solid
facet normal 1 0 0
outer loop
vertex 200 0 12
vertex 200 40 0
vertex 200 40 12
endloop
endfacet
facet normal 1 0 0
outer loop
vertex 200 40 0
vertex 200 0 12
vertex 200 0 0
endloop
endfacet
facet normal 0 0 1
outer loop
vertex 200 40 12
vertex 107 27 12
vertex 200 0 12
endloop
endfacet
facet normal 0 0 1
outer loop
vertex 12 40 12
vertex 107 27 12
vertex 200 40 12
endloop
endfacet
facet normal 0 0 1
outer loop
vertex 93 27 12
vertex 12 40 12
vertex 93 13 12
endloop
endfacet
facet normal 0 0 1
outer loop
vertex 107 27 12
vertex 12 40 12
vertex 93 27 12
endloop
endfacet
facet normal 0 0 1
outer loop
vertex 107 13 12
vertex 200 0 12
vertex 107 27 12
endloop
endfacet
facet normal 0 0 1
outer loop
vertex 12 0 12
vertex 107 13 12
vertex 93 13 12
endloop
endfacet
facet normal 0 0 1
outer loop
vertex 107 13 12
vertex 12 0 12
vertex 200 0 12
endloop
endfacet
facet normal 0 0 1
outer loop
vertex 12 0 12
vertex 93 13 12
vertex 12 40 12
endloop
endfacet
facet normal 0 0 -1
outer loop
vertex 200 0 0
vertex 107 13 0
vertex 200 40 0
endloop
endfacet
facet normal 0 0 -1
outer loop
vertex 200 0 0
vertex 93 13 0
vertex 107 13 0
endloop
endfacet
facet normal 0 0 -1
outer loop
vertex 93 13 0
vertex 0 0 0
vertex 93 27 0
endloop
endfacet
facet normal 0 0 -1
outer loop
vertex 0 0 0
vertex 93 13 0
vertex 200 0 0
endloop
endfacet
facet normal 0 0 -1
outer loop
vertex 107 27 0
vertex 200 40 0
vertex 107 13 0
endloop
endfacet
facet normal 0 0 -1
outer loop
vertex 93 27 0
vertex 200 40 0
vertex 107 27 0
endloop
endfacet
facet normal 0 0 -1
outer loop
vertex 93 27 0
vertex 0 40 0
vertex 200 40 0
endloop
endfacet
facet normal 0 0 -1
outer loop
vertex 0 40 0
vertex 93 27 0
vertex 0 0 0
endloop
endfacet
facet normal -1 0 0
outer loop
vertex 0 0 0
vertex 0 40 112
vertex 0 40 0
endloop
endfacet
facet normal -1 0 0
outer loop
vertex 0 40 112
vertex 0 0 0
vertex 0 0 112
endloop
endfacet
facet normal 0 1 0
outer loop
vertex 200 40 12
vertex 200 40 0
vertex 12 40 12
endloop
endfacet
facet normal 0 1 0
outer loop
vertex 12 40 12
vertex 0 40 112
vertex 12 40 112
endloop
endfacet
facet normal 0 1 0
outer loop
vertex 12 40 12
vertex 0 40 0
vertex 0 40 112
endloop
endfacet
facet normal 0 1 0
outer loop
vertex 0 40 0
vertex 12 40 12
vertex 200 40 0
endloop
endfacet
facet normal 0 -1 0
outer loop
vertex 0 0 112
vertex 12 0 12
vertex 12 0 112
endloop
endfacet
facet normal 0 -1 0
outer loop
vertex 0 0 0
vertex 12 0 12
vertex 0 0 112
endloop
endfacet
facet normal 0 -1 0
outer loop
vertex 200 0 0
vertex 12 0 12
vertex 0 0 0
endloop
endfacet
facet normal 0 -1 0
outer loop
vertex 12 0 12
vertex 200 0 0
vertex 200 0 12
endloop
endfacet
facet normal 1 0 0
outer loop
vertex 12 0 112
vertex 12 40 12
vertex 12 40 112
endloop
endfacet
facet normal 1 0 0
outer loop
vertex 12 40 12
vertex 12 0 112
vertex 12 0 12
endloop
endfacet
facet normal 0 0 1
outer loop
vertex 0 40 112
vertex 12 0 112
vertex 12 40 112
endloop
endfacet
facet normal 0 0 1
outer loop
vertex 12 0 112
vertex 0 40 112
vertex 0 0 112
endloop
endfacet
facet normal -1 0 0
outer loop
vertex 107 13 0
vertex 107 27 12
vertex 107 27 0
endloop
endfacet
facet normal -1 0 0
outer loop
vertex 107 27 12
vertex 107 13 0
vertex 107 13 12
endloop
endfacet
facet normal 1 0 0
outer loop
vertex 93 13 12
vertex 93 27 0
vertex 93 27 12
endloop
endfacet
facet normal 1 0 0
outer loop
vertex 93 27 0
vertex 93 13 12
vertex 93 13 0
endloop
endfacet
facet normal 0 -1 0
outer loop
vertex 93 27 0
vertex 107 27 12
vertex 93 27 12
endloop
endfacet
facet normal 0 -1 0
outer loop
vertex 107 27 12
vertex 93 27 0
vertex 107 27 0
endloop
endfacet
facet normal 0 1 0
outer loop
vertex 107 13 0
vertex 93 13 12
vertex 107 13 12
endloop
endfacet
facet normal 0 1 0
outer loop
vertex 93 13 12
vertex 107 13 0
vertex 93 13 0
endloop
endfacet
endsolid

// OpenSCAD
$fn = 32;

// ----------------------------------------------------------------------
// Gantry bracket: 200-250 mm L bracket
// ----------------------------------------------------------------------

// --- parameters (mm) ---
base_l = 200;             // base arm length, X
arm_w = 40;               // arm width, Y
thick = 12;               // arm thickness
up_h = 100;               // vertical arm height, Z
slot_w = 14;              // adjustment slot width in the base

total_h = up_h + thick;  // overall height

difference() {
  union() {
    cube([base_l, arm_w, thick]);
    cube([thick, arm_w, total_h]);
  }
  translate([base_l / 2 - slot_w / 2, arm_w / 2 - slot_w / 2, -1])
    cube([slot_w, slot_w, thick + 2]);
}
